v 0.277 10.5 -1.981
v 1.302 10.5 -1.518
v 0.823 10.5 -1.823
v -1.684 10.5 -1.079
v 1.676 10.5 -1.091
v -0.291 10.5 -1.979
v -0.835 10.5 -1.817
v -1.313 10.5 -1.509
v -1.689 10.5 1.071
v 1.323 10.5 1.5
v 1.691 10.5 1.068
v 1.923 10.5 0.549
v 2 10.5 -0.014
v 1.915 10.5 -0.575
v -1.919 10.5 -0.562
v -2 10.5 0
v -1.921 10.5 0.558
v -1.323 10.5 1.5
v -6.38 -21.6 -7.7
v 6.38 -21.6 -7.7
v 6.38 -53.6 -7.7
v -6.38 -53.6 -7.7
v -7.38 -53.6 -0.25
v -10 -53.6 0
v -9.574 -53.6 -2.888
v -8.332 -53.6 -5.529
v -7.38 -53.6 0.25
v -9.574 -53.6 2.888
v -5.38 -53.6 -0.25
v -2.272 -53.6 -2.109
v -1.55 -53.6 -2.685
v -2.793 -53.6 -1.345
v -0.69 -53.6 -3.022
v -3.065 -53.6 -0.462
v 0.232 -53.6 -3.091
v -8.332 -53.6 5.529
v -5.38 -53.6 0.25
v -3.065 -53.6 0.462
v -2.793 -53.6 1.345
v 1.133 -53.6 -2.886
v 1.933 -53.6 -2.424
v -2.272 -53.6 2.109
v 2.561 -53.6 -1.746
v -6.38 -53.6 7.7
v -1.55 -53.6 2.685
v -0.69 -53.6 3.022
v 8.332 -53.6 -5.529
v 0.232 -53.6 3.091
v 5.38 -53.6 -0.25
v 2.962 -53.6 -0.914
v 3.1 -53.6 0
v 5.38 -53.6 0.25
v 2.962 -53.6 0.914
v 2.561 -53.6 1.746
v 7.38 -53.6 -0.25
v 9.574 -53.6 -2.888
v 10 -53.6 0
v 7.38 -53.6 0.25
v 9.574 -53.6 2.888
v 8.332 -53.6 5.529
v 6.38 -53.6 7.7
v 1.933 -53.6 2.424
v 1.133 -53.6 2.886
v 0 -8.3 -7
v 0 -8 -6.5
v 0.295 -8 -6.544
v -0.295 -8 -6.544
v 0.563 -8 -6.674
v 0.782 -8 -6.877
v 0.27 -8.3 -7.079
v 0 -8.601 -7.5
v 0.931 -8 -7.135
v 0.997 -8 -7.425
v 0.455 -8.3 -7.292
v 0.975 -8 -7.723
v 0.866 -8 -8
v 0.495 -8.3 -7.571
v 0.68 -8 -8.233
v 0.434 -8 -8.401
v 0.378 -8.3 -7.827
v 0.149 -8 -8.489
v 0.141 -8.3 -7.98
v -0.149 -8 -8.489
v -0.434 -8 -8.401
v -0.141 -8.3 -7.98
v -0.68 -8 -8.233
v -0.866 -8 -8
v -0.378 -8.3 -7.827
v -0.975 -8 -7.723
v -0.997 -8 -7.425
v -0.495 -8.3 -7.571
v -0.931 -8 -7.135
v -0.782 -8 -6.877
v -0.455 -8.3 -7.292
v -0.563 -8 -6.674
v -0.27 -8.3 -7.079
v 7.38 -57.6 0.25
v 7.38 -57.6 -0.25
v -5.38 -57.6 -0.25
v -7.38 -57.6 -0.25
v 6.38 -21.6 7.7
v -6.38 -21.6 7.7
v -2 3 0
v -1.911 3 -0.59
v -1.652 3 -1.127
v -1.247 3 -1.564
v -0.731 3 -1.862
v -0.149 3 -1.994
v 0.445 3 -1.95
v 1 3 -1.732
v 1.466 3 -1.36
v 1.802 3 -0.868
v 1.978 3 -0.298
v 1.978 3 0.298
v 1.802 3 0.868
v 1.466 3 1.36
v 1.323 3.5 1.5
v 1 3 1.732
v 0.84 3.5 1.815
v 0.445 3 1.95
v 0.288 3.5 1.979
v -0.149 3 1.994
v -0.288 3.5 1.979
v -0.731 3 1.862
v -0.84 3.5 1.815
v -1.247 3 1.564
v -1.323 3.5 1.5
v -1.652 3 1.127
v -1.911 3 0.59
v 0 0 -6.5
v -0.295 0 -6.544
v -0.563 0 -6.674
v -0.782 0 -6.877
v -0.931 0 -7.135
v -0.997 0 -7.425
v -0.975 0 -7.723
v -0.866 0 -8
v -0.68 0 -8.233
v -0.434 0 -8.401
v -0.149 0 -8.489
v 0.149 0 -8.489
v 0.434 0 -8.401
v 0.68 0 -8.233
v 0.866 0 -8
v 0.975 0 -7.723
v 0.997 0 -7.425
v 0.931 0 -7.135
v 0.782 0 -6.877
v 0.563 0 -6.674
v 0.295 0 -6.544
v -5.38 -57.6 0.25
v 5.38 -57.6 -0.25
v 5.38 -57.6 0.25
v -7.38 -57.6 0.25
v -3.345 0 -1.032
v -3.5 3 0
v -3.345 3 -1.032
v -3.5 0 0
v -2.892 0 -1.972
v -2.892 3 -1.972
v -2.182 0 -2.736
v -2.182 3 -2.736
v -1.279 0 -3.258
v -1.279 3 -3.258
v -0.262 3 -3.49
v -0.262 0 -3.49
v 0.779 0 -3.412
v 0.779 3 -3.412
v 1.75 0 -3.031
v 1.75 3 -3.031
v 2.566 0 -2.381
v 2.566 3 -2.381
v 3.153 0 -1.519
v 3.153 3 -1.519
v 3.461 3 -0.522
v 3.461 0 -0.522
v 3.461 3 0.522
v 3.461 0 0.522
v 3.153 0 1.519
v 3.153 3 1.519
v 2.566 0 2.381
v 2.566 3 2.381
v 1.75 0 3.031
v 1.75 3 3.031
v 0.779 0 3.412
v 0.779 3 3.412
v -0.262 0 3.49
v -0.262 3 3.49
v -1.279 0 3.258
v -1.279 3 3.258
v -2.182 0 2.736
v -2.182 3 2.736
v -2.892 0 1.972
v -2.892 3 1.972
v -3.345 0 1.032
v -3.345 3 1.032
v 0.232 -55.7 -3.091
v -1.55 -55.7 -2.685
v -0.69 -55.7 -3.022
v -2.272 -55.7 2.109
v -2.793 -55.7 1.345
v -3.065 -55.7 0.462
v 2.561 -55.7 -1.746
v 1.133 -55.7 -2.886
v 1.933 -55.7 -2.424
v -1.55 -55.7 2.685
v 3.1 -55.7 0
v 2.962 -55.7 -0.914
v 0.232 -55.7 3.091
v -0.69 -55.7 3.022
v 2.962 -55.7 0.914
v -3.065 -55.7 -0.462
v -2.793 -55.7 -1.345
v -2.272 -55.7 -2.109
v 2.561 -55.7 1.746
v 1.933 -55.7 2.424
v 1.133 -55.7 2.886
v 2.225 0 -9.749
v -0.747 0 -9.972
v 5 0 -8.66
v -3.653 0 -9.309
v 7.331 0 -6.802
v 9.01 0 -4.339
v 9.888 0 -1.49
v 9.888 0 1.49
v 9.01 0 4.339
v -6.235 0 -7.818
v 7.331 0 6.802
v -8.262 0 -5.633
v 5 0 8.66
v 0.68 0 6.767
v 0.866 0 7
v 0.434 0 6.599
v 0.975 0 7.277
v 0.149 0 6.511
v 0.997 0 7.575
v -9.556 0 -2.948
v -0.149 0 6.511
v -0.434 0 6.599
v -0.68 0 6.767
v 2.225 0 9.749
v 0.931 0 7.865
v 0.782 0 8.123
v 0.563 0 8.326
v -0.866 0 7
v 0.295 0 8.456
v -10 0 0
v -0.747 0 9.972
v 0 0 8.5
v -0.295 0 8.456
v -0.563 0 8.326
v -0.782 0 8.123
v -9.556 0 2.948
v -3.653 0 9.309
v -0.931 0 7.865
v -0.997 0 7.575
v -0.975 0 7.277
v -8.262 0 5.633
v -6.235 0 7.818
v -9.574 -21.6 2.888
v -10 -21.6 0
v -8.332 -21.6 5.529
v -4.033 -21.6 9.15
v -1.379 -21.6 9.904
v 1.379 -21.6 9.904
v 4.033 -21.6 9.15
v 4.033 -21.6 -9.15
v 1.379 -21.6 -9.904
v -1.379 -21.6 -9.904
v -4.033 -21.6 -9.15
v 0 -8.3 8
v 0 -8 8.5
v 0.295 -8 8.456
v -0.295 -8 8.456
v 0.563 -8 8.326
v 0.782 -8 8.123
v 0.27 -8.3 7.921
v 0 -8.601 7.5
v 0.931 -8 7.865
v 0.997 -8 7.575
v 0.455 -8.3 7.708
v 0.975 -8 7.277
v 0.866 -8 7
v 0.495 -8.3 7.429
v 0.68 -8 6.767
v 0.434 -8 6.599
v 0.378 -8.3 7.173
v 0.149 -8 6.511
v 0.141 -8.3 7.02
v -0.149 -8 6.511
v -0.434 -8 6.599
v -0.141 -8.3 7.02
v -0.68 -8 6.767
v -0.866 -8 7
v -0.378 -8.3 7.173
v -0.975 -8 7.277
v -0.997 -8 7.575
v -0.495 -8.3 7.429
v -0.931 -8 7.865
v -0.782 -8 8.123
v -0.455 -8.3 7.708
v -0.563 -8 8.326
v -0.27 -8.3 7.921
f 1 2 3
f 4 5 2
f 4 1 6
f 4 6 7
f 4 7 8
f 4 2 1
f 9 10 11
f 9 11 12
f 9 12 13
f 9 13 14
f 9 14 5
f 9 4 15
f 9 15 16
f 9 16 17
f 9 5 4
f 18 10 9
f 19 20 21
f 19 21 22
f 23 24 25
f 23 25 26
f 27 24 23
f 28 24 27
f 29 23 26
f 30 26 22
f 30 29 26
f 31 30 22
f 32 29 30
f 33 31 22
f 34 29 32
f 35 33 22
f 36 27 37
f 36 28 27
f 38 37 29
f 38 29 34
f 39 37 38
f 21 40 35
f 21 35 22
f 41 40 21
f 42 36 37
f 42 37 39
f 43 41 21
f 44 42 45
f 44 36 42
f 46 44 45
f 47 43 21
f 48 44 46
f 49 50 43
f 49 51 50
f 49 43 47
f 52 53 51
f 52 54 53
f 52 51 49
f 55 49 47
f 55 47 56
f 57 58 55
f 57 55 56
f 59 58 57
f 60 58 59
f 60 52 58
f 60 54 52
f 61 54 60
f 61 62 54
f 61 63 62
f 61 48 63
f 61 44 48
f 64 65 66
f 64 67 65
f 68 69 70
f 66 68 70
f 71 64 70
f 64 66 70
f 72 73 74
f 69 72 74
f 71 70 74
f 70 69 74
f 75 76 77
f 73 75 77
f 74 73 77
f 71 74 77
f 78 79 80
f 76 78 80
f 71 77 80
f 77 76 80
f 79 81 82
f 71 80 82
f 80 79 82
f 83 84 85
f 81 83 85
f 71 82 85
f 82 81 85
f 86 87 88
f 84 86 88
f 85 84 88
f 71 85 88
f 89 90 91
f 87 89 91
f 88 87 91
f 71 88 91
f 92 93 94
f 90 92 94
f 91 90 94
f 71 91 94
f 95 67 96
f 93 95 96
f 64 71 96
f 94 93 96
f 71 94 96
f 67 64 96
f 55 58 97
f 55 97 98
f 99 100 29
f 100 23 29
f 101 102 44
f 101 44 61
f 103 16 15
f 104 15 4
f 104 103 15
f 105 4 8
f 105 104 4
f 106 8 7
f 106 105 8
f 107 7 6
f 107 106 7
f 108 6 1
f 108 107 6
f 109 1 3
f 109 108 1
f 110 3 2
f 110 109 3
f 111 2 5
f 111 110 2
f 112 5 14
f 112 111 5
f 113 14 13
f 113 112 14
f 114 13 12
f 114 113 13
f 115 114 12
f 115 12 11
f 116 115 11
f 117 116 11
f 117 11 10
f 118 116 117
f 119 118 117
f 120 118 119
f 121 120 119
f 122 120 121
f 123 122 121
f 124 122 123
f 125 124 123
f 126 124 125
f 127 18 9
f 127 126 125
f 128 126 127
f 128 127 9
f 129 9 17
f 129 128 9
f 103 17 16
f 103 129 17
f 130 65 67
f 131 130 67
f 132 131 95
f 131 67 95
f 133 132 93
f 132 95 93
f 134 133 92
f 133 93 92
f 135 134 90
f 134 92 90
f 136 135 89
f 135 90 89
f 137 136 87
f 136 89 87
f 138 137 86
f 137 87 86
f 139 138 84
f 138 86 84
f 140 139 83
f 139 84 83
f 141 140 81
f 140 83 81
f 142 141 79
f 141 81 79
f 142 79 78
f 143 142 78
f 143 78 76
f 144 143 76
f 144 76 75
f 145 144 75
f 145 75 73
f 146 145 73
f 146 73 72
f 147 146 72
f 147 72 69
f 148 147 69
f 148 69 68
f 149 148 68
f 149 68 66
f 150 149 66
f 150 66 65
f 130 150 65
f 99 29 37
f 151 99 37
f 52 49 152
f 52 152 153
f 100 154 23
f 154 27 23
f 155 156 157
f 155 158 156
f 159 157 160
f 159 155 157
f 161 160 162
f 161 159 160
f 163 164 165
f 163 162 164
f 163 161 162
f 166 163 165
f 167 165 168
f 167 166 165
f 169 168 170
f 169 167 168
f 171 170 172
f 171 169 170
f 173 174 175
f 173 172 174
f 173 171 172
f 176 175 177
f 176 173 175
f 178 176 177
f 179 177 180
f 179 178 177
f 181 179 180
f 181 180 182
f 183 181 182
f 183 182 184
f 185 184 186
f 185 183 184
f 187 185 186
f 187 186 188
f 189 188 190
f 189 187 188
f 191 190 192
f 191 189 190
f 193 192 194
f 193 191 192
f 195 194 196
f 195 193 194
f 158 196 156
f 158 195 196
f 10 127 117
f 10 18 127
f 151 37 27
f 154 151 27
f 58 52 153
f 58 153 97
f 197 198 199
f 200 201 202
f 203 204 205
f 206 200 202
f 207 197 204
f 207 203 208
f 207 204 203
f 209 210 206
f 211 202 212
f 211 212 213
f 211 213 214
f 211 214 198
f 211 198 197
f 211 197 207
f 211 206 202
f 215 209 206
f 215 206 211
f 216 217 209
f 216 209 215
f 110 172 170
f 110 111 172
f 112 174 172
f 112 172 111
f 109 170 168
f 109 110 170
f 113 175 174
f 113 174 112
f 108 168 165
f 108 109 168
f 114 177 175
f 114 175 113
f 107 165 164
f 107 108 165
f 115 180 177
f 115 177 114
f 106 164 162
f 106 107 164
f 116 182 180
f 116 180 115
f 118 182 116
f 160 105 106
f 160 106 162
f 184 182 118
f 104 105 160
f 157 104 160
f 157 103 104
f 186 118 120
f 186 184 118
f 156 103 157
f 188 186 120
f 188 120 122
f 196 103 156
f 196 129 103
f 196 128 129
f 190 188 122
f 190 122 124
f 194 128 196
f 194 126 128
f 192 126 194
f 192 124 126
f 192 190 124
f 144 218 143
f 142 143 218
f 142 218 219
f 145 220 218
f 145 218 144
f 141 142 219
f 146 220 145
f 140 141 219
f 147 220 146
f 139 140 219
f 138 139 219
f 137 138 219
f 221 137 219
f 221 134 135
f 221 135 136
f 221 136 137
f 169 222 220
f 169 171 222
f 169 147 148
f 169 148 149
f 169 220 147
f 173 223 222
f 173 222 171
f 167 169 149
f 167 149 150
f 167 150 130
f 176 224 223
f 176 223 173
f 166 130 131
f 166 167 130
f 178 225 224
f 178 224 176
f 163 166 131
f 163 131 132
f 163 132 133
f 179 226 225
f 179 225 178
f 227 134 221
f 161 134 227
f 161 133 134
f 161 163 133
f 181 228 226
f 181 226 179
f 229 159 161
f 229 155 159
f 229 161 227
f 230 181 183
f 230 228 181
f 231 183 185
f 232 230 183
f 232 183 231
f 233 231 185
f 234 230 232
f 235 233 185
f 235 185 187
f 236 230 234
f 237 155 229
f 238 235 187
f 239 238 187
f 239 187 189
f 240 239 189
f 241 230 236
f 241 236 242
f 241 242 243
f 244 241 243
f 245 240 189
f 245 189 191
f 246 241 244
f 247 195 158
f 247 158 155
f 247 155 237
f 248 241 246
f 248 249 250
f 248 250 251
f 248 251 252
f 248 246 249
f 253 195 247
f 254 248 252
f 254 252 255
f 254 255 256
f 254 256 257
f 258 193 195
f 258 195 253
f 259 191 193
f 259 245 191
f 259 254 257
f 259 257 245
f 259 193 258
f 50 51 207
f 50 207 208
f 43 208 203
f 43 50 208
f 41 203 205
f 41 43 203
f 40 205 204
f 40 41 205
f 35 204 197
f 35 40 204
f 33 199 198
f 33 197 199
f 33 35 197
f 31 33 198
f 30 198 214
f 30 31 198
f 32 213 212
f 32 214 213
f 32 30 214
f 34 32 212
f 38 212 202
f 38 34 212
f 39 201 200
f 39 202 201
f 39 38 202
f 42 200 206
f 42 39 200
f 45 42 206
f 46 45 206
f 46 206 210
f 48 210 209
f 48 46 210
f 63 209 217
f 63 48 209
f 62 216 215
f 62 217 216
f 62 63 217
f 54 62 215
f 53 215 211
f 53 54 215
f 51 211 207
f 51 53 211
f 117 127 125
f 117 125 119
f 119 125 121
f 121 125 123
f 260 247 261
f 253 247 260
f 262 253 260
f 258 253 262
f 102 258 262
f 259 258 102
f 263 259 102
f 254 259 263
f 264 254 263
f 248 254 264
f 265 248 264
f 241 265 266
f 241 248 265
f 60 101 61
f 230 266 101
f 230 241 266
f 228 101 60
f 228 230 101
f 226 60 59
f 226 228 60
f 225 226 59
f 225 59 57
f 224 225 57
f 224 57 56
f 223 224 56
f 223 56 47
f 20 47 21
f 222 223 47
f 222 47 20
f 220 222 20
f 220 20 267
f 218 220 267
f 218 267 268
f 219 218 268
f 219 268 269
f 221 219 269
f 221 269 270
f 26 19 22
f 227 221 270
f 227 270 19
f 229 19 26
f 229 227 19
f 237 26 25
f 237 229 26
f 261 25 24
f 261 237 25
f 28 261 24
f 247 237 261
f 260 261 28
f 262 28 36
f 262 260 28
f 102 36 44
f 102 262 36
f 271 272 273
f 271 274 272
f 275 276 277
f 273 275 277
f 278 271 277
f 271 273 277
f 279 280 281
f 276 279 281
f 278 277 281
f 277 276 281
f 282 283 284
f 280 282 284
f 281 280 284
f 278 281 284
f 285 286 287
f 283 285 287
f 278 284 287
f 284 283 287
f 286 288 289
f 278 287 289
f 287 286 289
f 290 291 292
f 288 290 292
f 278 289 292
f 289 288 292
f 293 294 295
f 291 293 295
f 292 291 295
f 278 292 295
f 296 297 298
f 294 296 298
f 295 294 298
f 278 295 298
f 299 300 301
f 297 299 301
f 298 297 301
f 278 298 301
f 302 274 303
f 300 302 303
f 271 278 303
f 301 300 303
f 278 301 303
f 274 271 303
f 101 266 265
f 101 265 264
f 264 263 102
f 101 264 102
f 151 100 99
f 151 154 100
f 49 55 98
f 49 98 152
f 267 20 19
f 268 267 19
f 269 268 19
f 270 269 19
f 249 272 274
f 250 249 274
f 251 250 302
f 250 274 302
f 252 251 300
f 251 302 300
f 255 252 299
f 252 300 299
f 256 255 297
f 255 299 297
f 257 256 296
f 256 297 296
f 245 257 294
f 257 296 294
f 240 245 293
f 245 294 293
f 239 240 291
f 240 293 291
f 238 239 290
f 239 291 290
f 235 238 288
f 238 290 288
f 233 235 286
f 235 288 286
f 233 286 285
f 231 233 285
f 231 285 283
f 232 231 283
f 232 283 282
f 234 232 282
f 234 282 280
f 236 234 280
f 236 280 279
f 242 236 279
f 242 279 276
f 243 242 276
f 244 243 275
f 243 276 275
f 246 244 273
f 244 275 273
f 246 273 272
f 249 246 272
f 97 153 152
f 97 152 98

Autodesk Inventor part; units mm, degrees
ref_plane "YZ Plane" through (0, 0, 0) normal (1, 0, 0) x (0, 1, 0)
ref_plane "XZ Plane" through (0, 0, 0) normal (0, 1, 0) x (-1, 0, 0)
ref_plane "XY Plane" through (0, 0, 0) normal (0, 0, 1) x (1, 0, 0)
sketch "Эскиз1" plane through (0, 0, 0) normal (0, 1, 0) x (-1, 0, 0)
  circle A0 centre (0, 0) radius 10
  circle A1 centre (0, 0) radius 3.5
  circle A2 centre (0, 0) radius 2
  dimension "d0" = 20
  dimension "d1" = 7
  dimension "d2" = 4
extrude "Выдавливание1" add sketch "Эскиз1" against normal blind 21.6 contours A0 | A1 | A2
extrude "Выдавливание2" add sketch "Эскиз1" along normal blind 3 contours A1
extrude "Выдавливание3" add sketch "Эскиз1" along normal blind 10.5 contours A2
sketch "Эскиз2" plane through (0, 10.5, 0) normal (0, 1, 0) x (1, 0, 0)
  circle A0 centre (0, 0) radius 2 projected
  circle A1 centre (0, 0) radius 2 projected
  circle A2 centre (0, 0) radius 3.5 projected
  line L0 (-3.1623, -1.5) -> (3.1623, -1.5)
  point P0 (0, 2)
  point P1 (0, 3.5)
  point P2 (1.3229, -1.5)
  point P3 (-1.3229, -1.5)
  dimension "d9" = 1.5
extrude "Выдавливание4" cut sketch "Эскиз2" against normal blind 7 contours L0 A0 picked at (0.3089, -1.5908)
sketch "Эскиз3" plane through (0, -21.6, 0) normal (0, -1, 0) x (1, 0, 0)
  line L0 (6.3804, -7.7) -> (-6.3804, -7.7)
  line L1 (-6.3804, -7.7) -> (-6.3804, 7.7)
  line L2 (-6.3804, 7.7) -> (6.3804, 7.7)
  line L3 (6.3804, 7.7) -> (6.3804, -7.7)
  circle A0 centre (0, 0) radius 10 projected
  arc A1 (6.3804, -7.7) -> (6.3804, 7.7) centre (0, 0) ccw
  arc A2 (-6.3804, 7.7) -> (-6.3804, -7.7) centre (0, 0) ccw
  line L4 (5.3804, 0.25) -> (7.3804, 0.25)
  line L5 (7.3804, 0.25) -> (7.3804, -0.25)
  line L6 (7.3804, -0.25) -> (5.3804, -0.25)
  line L7 (5.3804, -0.25) -> (5.3804, 0.25)
  line L8 (5.3804, 0.25) -> (7.3804, -0.25) construction
  line L9 (0, -7.7) -> (0, 7.7) construction
  line L10 (-5.3804, 0.25) -> (-7.3804, 0.25)
  line L11 (-7.3804, 0.25) -> (-7.3804, -0.25)
  line L12 (-7.3804, -0.25) -> (-5.3804, -0.25)
  line L13 (-5.3804, -0.25) -> (-5.3804, 0.25)
  point P0 (6.3804, 0)
  point P1 (-6.3804, -7.7)
  dimension "d12" = 15.4
  dimension "d13" = 2
  dimension "d14" = 0.5
extrude "Выдавливание5" add sketch "Эскиз3" along normal blind 36 contours L6 L7 L4 L3 | L3 L4 L5 L6 | L12 L11 L10 L1 | L1 L10 L13 L12
extrude "Выдавливание6" add sketch "Эскиз3" along normal blind 32 contours L0 L1 L12 L13 L10 L2 L3 L4 L7 L6 | L3 L6 L5 L4 A0 | A0 L1 L10 L11 L12
sketch "Эскиз4" plane through (0, -53.6, 0) normal (0, -1, 0) x (1, 0, 0)
  circle A0 centre (0, 0) radius 2 projected
  circle A1 centre (0, 0) radius 3.1
  dimension "d19" = 6.2
extrude "Выдавливание7" add sketch "Эскиз4" along normal blind 2.1 contours A0 | A1
sketch "Эскиз5" plane through (0, 0, 0) normal (0, 1, 0) x (1, 0, 0)
  circle A0 centre (0, 0) radius 10 construction
  line L0 (0, 10) -> (0, -10) construction
  circle A1 centre (0, 7.5) radius 1
  circle A2 centre (0, -7.5) radius 1
  dimension "d22" = 7.5
  dimension "d23" = 15
  dimension "d24" = 2
hole "Отверстие1" at (0, 0, 7.5) direction (0, -1, 0) diameter 2 depth 8 tip angle 118
hole "Отверстие2" at (0, 0, -7.5) direction (0, -1, 0) diameter 2 depth 8 tip angle 118
properties part number "motor20" material "Сталь"
